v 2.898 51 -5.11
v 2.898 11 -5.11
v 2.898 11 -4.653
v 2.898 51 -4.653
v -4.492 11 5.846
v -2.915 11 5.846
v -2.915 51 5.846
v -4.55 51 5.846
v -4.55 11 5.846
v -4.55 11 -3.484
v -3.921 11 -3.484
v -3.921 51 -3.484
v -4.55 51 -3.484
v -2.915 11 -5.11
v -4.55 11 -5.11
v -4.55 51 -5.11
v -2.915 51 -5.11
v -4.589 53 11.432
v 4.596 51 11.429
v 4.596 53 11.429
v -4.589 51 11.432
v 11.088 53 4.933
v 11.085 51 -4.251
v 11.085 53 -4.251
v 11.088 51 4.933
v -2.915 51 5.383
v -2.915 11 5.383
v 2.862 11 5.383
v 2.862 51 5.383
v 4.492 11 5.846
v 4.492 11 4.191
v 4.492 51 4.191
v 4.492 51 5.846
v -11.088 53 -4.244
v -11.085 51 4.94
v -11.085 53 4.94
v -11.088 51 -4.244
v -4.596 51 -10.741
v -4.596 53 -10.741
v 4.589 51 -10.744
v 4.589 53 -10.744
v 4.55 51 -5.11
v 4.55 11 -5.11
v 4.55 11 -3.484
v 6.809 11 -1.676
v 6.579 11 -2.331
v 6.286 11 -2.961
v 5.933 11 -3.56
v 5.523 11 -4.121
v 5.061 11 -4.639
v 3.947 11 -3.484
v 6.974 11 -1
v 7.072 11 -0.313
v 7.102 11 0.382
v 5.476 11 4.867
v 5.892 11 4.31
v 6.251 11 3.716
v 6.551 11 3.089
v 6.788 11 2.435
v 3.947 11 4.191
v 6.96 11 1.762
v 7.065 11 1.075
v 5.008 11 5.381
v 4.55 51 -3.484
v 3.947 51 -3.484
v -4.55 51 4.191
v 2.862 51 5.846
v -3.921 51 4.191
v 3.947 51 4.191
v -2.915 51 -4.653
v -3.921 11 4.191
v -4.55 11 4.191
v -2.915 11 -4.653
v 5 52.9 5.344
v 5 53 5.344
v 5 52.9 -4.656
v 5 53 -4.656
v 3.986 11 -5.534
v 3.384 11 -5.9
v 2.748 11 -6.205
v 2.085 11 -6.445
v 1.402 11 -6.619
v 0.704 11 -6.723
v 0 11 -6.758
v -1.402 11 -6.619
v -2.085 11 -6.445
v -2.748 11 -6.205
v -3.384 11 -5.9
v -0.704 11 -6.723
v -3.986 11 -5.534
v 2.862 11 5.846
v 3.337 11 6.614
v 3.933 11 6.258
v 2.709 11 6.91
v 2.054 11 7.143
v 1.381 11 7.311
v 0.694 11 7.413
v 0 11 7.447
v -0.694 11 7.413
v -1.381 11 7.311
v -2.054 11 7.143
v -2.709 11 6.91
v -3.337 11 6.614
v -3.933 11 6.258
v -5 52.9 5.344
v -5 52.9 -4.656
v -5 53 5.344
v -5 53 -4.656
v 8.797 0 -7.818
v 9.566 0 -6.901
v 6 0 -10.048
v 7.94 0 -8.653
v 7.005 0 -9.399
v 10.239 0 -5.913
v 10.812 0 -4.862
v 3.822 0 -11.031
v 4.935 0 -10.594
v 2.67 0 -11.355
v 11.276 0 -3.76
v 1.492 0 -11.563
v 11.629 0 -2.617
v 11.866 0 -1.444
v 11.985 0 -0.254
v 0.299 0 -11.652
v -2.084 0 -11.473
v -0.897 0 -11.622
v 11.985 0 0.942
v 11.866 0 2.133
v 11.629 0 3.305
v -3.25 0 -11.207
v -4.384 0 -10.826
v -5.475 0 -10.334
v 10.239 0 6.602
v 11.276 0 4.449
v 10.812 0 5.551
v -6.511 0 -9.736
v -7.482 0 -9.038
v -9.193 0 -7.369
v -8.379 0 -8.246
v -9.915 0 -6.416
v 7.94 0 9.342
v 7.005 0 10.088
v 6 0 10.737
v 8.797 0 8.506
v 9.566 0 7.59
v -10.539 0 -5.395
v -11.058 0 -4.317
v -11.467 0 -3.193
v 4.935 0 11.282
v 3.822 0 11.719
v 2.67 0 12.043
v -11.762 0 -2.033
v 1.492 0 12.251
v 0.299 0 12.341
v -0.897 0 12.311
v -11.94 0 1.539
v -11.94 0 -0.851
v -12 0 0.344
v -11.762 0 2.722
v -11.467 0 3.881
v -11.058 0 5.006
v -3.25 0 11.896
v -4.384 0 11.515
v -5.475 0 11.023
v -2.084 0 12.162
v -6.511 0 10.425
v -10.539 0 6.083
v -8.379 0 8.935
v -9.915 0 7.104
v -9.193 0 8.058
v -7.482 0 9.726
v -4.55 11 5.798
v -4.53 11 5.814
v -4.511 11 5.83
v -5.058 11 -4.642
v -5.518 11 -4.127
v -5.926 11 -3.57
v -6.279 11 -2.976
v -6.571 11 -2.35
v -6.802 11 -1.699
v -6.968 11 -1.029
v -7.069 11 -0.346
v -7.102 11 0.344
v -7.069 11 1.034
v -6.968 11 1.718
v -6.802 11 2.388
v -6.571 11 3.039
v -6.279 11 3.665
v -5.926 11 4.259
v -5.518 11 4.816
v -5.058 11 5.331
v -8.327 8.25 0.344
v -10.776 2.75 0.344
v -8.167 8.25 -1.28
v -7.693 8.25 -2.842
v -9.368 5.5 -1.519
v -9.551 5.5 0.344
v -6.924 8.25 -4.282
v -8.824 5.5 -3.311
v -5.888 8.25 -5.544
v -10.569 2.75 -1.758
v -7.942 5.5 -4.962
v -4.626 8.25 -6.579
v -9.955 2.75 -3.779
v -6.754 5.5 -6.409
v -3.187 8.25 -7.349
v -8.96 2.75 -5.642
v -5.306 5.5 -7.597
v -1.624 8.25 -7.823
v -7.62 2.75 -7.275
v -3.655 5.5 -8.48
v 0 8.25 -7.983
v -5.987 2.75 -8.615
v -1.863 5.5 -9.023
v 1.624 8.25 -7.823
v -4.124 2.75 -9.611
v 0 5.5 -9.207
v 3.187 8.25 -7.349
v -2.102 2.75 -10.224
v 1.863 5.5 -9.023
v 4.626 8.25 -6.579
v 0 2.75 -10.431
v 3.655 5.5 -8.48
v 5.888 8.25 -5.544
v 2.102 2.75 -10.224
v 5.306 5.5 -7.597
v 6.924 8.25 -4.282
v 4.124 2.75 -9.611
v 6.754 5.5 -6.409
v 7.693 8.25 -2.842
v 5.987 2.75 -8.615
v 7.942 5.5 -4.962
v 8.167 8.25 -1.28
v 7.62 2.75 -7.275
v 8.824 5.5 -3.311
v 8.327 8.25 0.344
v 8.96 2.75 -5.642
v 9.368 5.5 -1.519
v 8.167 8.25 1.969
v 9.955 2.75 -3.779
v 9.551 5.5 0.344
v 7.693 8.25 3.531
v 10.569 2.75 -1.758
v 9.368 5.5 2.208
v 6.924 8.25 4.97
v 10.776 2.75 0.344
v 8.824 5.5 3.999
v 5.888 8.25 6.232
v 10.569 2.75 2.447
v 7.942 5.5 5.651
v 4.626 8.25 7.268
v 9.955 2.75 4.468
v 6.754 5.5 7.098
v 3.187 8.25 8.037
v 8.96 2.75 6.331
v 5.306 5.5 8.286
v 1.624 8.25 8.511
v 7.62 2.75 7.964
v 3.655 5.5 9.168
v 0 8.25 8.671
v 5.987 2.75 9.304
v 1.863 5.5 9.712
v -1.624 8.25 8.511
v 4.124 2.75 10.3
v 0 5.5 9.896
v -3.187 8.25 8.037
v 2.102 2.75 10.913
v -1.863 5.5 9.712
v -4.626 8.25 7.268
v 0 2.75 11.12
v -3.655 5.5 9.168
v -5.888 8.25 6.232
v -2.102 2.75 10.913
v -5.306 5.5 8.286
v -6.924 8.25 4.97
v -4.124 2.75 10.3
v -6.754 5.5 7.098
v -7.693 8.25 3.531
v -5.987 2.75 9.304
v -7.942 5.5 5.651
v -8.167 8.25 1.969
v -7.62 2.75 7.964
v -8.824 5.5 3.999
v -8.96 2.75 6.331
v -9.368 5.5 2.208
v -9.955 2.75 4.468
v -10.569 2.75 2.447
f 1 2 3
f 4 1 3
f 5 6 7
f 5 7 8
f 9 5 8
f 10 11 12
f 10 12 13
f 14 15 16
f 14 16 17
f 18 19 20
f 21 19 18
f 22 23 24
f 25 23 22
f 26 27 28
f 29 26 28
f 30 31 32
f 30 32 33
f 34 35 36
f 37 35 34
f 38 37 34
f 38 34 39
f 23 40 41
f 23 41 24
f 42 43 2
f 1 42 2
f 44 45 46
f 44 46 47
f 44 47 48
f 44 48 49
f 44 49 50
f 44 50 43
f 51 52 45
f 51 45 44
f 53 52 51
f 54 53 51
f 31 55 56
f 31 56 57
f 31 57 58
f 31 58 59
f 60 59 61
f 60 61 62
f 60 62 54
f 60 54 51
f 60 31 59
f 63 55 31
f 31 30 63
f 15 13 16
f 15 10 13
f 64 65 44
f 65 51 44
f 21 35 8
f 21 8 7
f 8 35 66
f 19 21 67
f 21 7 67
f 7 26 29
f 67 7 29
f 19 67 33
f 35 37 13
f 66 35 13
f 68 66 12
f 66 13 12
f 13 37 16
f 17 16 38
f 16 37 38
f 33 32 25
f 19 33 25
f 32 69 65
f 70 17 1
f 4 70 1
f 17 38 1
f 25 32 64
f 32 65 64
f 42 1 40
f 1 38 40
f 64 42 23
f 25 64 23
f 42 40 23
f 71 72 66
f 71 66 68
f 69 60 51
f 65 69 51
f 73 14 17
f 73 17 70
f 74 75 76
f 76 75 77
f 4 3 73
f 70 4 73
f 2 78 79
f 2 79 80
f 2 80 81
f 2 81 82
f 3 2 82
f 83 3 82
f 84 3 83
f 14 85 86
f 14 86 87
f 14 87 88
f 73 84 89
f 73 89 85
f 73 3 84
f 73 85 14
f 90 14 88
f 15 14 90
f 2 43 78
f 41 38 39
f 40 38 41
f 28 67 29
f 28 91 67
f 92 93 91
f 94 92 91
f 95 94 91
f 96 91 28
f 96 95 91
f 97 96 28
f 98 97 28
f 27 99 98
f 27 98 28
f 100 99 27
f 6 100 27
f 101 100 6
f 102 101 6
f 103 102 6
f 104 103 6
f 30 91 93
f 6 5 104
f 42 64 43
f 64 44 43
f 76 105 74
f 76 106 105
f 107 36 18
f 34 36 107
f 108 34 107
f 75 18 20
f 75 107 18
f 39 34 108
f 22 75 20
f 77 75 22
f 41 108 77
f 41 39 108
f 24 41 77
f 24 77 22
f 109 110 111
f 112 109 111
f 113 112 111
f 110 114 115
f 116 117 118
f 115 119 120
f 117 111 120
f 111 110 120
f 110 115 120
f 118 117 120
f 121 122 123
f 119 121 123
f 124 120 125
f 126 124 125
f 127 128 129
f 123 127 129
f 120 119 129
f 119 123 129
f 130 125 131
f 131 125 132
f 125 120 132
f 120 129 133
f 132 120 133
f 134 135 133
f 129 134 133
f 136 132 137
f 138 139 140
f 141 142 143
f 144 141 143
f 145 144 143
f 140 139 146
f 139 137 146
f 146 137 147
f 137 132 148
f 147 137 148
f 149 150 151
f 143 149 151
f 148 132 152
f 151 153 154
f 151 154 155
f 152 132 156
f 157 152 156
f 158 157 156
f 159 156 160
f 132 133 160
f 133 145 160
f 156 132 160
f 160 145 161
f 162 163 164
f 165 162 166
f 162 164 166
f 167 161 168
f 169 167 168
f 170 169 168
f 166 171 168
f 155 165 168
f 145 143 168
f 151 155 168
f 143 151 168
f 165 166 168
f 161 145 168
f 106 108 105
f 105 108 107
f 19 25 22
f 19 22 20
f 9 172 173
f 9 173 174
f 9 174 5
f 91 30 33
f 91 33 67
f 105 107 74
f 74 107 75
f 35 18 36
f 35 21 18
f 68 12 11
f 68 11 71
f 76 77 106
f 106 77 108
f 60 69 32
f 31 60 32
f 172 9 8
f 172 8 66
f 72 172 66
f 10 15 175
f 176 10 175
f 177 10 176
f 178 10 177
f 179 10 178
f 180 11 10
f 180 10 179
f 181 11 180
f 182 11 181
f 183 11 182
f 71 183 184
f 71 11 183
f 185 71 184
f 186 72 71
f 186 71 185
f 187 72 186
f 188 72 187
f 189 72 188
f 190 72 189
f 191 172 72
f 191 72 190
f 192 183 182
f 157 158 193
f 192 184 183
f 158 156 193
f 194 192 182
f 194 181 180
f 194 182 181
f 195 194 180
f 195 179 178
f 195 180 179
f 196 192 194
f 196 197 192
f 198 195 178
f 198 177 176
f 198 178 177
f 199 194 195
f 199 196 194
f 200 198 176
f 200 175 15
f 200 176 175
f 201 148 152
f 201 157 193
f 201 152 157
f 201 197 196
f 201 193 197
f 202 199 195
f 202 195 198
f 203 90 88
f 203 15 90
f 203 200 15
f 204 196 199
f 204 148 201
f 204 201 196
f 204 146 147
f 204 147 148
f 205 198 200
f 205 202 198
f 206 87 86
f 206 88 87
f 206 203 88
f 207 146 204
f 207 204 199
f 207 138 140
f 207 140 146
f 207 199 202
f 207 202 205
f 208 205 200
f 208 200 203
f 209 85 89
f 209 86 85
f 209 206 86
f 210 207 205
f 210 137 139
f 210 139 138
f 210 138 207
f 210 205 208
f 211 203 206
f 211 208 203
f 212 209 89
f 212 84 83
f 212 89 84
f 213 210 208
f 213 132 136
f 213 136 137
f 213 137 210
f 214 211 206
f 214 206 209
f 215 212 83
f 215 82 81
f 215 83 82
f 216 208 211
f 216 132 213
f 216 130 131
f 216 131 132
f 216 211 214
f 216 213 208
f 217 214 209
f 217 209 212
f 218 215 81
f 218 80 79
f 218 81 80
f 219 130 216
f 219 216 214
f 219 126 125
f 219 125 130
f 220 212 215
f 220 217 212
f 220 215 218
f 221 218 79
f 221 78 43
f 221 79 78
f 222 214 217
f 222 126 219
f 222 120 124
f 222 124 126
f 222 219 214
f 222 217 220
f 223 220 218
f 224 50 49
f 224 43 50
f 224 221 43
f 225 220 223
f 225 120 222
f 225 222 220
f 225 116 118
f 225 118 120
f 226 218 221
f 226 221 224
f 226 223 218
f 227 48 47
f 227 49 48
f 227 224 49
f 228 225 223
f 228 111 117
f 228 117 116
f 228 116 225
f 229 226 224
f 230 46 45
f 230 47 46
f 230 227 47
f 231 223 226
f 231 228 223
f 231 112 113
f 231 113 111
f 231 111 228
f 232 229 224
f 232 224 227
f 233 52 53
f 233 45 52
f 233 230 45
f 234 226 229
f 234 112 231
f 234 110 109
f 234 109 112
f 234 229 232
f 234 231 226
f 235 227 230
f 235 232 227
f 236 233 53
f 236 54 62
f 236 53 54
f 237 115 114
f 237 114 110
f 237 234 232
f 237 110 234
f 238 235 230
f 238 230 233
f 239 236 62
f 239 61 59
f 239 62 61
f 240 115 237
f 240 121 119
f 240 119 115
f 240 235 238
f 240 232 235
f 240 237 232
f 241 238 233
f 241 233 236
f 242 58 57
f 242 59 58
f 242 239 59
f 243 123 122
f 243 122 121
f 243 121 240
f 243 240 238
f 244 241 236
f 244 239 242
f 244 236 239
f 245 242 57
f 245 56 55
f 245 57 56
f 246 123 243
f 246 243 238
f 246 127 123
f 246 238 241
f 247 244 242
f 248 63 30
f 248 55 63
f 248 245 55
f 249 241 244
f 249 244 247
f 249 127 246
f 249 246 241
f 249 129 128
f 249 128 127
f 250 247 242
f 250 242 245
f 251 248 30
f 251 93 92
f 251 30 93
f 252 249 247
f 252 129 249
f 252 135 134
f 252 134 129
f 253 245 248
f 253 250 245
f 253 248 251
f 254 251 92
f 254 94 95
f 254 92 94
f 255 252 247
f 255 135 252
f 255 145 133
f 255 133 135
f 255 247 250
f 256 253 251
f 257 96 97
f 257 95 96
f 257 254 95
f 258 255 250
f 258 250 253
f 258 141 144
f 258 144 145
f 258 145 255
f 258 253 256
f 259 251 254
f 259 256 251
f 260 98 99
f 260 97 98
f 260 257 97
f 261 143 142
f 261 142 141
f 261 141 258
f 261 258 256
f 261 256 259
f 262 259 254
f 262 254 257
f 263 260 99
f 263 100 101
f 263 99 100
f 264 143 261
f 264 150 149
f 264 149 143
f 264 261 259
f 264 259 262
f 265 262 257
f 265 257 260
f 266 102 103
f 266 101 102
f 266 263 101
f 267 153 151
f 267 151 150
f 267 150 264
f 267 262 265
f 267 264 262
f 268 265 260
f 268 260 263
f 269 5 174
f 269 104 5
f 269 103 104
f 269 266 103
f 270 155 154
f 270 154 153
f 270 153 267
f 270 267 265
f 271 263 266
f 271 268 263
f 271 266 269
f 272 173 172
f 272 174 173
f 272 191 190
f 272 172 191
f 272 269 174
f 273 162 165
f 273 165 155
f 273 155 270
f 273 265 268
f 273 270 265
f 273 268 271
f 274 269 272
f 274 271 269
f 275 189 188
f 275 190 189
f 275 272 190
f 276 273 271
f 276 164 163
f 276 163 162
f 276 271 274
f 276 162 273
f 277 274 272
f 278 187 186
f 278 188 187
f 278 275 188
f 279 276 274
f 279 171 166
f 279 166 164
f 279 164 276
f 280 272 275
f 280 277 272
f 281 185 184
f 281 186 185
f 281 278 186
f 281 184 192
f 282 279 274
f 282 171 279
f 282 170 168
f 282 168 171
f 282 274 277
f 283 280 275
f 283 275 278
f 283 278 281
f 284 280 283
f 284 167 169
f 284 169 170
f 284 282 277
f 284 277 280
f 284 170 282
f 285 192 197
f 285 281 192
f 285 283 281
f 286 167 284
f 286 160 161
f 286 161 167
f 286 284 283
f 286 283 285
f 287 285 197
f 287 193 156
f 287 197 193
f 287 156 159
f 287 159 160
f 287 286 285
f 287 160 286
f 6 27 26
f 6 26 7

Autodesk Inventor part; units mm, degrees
ref_plane "YZ Plane" through (0, 0, 0) normal (1, 0, 0) x (0, 1, 0)
ref_plane "XZ Plane" through (0, 0, 0) normal (0, 1, 0) x (-1, 0, 0)
ref_plane "XY Plane" through (0, 0, 0) normal (0, 0, 1) x (1, 0, 0)
sketch "草圖1" plane through (0, 0, 0) normal (0, 1, 0) x (-1, 0, 0)
  circle A0 centre (0, 0.3443) radius 12
  point P0 (0, 0)
  dimension "d0" = 24
extrude "擠出1" add sketch "草圖1" along normal blind 11
draft "面拔模1" angle 24 pull direction (0, 1, 0) faces at (-11.8446, 7.3333, -1.5807) fixed edges at (12, 0, 0.3443)
sketch "草圖2" plane through (0, 11, 0.3443) normal (0, 1, 0) x (1, 0, 0)
  line L0 (-4.5495, -3.8466) -> (-2.9152, -3.8466)
  line L1 (-2.9152, -3.8466) -> (-2.9152, -5.5016)
  line L2 (-2.9152, -5.5016) -> (-4.5495, -5.5016)
  line L3 (-4.5495, -5.5016) -> (-4.5495, -3.8466)
  circle A0 centre (0, 0) radius 7.1025 projected
  line L4 (-4.5495, 5.4541) -> (-2.9152, 5.4541)
  line L5 (-2.9152, 5.4541) -> (-2.9152, 3.8283)
  line L6 (-2.9152, 3.8283) -> (-4.5495, 3.8283)
  line L7 (-4.5495, 3.8283) -> (-4.5495, 5.4541)
  line L8 (4.5495, 5.4541) -> (2.8978, 5.4541)
  line L9 (2.8978, 5.4541) -> (2.8978, 3.8283)
  line L10 (2.8978, 3.8283) -> (4.5495, 3.8283)
  line L11 (4.5495, 3.8283) -> (4.5495, 5.4541)
  line L12 (4.492, -5.5016) -> (2.862, -5.5016)
  line L13 (2.862, -5.5016) -> (2.862, -3.8466)
  line L14 (2.862, -3.8466) -> (4.492, -3.8466)
  line L15 (4.492, -3.8466) -> (4.492, -5.5016)
  line L16 (-3.9212, 3.8283) -> (-3.9212, -3.8466)
  line L17 (-2.9152, -5.0387) -> (2.862, -5.0387)
  line L18 (3.9473, -3.8466) -> (3.9473, 3.8283)
  line L19 (2.8978, 4.9975) -> (-2.9152, 4.9975)
  point P0 (0, 0.3443)
  dimension "d4" = 1.63
extrude "擠出2" add sketch "草圖2" along normal blind 40 contours L0 L1 L2 A0 L3 | L16 L6 L5 L19 L9 L10 L18 L14 L13 L17 L1 L0 | A0 L2 L3 | L6 L7 L4 L5 | L11 L10 L9 L8 | L12 L13 L14 L15
sketch "草圖3" plane through (0, 51, 0.3443) normal (0, 1, 0) x (1, 0, 0)
  circle A0 centre (0, 0) radius 12 projected
  line L0 (-4.5956, 11.0851) -> (4.5888, 11.088)
  line L1 (4.5888, 11.088) -> (11.0851, 4.5956)
  line L2 (11.0851, 4.5956) -> (11.088, -4.5888)
  line L3 (11.088, -4.5888) -> (4.5956, -11.0851)
  line L4 (4.5956, -11.0851) -> (-4.5888, -11.088)
  line L5 (-4.5888, -11.088) -> (-11.0851, -4.5956)
  line L6 (-11.0851, -4.5956) -> (-11.088, 4.5888)
  line L7 (-11.088, 4.5888) -> (-4.5956, 11.0851)
extrude "擠出3" add sketch "草圖3" along normal blind 2 contours L2 L3 L4 L5 L6 L7 L0 L1
sketch "草圖4" plane through (0, 53, 0.3443) normal (0, 1, 0) x (1, 0, 0)
  line L0 (5, -5) -> (5, 5)
  line L1 (5, 5) -> (-5, 5)
  line L2 (-5, 5) -> (-5, -5)
  line L3 (-5, -5) -> (5, -5)
  line L4 (5, -5) -> (-5, 5) construction
  line L5 (5, 5) -> (-5, -5) construction
  point P0 (0, 0.3443)
  point P1 (0, 0)
  dimension "d9" = 10
  dimension "d10" = 10
extrude "擠出4" cut sketch "草圖4" against normal blind 0.1
properties part number "盤子上布丁"
